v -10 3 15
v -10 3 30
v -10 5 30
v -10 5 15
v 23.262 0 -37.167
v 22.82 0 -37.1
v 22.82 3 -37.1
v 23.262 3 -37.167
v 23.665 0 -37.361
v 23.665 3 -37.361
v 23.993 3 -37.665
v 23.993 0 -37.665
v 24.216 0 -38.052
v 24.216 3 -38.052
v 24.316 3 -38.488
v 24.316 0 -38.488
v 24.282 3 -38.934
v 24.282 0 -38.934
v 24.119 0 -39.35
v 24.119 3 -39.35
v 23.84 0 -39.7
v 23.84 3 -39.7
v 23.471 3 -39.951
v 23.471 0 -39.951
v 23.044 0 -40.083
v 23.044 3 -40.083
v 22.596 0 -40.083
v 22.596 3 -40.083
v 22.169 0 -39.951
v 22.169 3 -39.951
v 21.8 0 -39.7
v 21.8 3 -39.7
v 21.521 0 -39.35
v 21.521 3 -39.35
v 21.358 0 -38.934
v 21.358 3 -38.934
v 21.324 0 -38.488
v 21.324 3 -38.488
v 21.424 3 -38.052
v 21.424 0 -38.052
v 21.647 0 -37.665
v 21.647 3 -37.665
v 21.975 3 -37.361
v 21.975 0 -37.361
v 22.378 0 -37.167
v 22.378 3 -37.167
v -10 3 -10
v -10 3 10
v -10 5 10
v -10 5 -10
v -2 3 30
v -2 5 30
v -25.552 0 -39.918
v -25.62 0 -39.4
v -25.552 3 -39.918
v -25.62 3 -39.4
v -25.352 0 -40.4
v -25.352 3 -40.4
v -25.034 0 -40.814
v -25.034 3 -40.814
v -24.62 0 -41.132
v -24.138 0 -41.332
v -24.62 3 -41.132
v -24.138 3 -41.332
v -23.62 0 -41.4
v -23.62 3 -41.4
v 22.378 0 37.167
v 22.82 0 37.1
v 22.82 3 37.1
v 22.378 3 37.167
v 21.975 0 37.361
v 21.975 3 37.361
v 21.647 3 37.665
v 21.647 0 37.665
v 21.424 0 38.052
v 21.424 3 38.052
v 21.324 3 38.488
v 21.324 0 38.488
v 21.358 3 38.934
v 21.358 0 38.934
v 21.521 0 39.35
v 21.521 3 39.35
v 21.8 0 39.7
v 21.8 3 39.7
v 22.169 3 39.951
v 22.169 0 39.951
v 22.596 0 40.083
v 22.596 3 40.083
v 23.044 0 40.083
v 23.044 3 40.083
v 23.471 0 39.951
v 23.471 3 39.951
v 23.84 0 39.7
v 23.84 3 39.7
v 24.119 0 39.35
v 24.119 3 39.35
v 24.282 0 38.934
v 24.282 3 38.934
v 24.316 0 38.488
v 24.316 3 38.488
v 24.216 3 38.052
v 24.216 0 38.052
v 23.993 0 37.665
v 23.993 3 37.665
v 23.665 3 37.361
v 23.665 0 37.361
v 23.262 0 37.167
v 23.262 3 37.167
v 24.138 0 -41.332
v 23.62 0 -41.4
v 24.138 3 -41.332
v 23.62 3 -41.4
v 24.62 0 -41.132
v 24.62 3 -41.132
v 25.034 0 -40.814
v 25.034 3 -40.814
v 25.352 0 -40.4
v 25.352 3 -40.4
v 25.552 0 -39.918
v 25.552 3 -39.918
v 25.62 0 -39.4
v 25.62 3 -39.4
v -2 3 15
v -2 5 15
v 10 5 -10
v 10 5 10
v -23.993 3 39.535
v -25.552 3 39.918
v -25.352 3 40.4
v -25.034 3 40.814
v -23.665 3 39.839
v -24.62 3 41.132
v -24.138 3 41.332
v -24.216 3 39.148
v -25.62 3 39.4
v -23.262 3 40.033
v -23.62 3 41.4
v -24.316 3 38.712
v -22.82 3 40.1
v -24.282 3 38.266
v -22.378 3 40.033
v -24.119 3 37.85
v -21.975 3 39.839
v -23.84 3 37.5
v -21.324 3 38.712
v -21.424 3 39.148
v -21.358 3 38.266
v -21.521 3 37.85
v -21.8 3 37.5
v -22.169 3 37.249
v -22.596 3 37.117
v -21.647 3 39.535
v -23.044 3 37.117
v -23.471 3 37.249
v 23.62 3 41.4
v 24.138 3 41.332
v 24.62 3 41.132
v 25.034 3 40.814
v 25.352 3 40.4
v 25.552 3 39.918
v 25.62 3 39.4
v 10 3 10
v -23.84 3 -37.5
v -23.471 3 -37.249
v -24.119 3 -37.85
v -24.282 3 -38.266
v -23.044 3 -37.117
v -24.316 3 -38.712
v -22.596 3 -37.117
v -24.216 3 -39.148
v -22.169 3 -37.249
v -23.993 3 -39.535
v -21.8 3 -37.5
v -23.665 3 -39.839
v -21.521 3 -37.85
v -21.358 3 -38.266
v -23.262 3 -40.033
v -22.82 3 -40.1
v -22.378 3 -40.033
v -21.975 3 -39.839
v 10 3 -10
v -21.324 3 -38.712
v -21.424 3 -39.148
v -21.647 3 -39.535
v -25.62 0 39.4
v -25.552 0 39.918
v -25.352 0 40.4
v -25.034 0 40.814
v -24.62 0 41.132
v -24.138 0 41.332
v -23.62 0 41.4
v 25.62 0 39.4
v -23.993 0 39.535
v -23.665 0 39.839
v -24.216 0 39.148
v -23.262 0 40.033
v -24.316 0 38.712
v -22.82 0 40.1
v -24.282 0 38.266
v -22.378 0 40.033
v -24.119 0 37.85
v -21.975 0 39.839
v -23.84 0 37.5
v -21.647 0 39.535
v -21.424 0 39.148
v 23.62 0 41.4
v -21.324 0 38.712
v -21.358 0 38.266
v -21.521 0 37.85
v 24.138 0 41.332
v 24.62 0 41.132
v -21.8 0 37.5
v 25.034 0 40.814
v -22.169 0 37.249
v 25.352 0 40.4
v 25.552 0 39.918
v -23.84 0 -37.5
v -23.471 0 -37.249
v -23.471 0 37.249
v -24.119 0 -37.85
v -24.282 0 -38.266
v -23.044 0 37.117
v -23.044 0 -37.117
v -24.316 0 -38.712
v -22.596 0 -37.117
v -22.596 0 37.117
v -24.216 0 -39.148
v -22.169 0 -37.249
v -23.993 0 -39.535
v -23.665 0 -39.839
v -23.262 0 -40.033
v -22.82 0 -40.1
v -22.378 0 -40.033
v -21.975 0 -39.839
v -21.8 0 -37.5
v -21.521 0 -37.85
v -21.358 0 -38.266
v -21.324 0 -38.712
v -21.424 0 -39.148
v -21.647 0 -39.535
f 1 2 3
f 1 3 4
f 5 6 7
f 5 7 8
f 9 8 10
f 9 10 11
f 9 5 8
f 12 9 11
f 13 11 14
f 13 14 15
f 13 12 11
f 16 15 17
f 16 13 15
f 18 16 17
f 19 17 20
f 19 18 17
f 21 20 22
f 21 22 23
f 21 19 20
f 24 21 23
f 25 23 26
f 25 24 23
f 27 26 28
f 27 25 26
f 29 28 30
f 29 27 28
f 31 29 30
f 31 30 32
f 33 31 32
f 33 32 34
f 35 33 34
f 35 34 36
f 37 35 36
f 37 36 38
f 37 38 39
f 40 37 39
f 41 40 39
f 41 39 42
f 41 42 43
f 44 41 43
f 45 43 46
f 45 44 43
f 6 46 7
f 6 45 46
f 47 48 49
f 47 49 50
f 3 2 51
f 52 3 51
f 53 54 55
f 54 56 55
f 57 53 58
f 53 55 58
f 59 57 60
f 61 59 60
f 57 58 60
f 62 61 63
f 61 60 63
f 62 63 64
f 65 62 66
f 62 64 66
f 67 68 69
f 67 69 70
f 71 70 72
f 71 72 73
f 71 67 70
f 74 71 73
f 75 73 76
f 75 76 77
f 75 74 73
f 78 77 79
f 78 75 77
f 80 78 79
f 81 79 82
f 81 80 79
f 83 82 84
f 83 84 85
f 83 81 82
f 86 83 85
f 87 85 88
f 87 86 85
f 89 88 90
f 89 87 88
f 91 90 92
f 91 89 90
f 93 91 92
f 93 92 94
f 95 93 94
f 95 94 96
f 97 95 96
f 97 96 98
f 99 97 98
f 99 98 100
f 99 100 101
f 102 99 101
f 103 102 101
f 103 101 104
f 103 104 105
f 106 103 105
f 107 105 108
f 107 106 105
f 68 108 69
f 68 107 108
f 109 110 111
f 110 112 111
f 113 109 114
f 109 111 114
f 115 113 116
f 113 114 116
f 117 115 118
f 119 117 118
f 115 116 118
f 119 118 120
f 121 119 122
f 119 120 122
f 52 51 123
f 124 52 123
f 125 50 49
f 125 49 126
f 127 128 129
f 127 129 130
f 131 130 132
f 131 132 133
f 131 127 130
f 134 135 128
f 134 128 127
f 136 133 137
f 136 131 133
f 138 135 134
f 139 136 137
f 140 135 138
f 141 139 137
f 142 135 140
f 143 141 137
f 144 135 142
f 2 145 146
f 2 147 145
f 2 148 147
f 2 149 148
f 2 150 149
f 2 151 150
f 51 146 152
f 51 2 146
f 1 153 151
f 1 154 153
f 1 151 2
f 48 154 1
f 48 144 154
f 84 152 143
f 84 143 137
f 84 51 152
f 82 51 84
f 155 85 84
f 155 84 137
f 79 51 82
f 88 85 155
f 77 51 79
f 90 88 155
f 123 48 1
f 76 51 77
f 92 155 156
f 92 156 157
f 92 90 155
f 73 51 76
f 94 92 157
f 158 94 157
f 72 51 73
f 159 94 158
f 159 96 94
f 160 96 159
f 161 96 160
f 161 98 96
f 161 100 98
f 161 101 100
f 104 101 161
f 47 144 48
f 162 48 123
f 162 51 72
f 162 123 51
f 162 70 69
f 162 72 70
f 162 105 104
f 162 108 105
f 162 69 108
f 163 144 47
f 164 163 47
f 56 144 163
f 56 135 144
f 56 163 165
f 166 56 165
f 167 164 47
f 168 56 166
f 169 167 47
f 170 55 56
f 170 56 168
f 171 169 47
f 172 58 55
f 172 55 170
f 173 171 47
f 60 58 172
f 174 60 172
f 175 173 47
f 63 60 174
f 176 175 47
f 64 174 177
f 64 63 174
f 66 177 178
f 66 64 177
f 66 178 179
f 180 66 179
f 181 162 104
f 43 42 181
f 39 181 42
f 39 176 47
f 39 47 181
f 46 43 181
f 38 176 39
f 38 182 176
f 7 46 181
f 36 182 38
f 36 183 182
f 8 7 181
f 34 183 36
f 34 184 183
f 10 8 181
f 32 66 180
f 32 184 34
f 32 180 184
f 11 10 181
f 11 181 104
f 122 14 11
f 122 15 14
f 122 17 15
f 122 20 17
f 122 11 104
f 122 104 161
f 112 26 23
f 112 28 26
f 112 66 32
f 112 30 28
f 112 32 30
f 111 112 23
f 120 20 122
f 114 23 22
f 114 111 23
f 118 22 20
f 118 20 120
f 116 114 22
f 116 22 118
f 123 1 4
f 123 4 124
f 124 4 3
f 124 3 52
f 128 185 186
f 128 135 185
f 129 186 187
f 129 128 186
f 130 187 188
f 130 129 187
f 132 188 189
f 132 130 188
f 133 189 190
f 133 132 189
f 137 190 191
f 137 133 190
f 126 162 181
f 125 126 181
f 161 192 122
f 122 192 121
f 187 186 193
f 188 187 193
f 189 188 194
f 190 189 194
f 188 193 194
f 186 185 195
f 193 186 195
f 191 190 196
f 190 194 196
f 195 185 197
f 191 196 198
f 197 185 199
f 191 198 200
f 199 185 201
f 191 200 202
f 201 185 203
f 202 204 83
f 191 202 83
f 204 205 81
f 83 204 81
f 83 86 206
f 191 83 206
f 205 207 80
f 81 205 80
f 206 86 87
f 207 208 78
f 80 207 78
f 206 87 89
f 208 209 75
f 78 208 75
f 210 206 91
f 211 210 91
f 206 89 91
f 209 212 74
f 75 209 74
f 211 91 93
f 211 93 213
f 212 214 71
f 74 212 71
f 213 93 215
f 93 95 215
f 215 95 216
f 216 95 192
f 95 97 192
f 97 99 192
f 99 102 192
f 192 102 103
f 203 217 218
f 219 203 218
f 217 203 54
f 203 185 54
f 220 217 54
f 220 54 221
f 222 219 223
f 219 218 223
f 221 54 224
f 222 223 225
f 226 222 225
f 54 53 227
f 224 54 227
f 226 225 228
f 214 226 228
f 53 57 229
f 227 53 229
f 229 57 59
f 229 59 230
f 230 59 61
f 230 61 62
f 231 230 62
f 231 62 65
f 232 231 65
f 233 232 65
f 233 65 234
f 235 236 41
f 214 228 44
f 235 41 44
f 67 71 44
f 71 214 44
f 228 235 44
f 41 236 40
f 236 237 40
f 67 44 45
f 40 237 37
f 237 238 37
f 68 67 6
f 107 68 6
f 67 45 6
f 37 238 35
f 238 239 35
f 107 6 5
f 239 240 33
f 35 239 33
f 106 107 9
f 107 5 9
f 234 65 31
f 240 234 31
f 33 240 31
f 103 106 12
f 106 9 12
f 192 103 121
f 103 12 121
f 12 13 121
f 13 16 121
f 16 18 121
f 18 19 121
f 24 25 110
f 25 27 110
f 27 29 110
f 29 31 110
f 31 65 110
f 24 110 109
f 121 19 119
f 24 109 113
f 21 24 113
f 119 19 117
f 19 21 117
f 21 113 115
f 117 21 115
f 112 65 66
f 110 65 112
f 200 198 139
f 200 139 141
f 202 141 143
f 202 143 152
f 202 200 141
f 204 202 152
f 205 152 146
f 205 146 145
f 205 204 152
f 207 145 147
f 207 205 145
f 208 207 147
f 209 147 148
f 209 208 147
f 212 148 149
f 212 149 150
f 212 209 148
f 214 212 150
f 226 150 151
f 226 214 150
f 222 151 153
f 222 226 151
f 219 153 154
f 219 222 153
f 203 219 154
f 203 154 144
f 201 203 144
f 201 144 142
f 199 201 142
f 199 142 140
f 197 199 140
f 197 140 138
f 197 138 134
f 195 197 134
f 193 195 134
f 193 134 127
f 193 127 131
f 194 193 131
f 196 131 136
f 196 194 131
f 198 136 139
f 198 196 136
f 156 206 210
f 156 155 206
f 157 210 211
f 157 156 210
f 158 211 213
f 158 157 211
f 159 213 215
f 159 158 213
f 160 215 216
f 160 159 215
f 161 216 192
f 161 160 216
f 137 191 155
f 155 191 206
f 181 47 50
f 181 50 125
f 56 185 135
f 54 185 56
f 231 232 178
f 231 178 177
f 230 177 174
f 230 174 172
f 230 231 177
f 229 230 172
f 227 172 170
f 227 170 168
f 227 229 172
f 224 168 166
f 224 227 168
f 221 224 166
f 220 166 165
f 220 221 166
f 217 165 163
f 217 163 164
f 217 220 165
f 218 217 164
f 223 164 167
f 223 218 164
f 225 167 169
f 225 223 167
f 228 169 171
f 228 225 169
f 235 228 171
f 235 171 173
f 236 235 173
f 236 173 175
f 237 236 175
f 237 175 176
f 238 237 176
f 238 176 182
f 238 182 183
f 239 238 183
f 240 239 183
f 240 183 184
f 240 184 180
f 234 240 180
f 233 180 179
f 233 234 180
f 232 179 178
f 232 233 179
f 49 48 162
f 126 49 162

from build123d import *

# Parameters (mm, degrees)
SKETCH_1_W      = 51.24
SKETCH_1_H      = 82.8
SKETCH_1_R      = 1.5
EXTRUDE_1_DEPTH = 3
SKETCH_2_W      = 20
SKETCH_2_H      = 20
SKETCH_2_W_2    = 8
SKETCH_2_H_2    = 15
EXTRUDE_2_DEPTH = 2
FILLET_1_R      = 2


with BuildPart() as part:
    # 草图1 → 凸台-拉伸1 (new body)
    with BuildSketch(Plane(origin=(0, 0, 0), x_dir=(1, 0, 0), z_dir=(0, 1, 0))):
        Rectangle(SKETCH_1_W, SKETCH_1_H)
        with Locations(Location((22.82, 38.6, 0), (0, 0, 270))):
            Circle(SKETCH_1_R, mode=Mode.SUBTRACT)
        with Locations(Location((-22.82, 38.6, 0), (0, 0, 90))):
            Circle(SKETCH_1_R, mode=Mode.SUBTRACT)
        with Locations(Location((-22.82, -38.6, 0), (0, 0, 270))):
            Circle(SKETCH_1_R, mode=Mode.SUBTRACT)
        with Locations(Location((22.82, -38.6, 0), (0, 0, 90))):
            Circle(SKETCH_1_R, mode=Mode.SUBTRACT)
    extrude(amount=EXTRUDE_1_DEPTH)

    # 草图2 → 凸台-拉伸2 (add)
    with BuildSketch(Plane(origin=(0, 3, 0), x_dir=(1, 0, 0), z_dir=(0, 1, 0))):
        Rectangle(SKETCH_2_W, SKETCH_2_H)
        with Locations((-6, -22.5)):
            Rectangle(SKETCH_2_W_2, SKETCH_2_H_2)
    extrude(amount=EXTRUDE_2_DEPTH)

    # 圆角1
    fillet_1_edges = [part.edges().sort_by_distance(p)[0] for p in [
        (-25.62, 1.5, 41.4),
        (-25.62, 1.5, -41.4),
        (25.62, 1.5, -41.4),
        (25.62, 1.5, 41.4),
    ]]
    fillet(fillet_1_edges, radius=FILLET_1_R)


solid = part.part
